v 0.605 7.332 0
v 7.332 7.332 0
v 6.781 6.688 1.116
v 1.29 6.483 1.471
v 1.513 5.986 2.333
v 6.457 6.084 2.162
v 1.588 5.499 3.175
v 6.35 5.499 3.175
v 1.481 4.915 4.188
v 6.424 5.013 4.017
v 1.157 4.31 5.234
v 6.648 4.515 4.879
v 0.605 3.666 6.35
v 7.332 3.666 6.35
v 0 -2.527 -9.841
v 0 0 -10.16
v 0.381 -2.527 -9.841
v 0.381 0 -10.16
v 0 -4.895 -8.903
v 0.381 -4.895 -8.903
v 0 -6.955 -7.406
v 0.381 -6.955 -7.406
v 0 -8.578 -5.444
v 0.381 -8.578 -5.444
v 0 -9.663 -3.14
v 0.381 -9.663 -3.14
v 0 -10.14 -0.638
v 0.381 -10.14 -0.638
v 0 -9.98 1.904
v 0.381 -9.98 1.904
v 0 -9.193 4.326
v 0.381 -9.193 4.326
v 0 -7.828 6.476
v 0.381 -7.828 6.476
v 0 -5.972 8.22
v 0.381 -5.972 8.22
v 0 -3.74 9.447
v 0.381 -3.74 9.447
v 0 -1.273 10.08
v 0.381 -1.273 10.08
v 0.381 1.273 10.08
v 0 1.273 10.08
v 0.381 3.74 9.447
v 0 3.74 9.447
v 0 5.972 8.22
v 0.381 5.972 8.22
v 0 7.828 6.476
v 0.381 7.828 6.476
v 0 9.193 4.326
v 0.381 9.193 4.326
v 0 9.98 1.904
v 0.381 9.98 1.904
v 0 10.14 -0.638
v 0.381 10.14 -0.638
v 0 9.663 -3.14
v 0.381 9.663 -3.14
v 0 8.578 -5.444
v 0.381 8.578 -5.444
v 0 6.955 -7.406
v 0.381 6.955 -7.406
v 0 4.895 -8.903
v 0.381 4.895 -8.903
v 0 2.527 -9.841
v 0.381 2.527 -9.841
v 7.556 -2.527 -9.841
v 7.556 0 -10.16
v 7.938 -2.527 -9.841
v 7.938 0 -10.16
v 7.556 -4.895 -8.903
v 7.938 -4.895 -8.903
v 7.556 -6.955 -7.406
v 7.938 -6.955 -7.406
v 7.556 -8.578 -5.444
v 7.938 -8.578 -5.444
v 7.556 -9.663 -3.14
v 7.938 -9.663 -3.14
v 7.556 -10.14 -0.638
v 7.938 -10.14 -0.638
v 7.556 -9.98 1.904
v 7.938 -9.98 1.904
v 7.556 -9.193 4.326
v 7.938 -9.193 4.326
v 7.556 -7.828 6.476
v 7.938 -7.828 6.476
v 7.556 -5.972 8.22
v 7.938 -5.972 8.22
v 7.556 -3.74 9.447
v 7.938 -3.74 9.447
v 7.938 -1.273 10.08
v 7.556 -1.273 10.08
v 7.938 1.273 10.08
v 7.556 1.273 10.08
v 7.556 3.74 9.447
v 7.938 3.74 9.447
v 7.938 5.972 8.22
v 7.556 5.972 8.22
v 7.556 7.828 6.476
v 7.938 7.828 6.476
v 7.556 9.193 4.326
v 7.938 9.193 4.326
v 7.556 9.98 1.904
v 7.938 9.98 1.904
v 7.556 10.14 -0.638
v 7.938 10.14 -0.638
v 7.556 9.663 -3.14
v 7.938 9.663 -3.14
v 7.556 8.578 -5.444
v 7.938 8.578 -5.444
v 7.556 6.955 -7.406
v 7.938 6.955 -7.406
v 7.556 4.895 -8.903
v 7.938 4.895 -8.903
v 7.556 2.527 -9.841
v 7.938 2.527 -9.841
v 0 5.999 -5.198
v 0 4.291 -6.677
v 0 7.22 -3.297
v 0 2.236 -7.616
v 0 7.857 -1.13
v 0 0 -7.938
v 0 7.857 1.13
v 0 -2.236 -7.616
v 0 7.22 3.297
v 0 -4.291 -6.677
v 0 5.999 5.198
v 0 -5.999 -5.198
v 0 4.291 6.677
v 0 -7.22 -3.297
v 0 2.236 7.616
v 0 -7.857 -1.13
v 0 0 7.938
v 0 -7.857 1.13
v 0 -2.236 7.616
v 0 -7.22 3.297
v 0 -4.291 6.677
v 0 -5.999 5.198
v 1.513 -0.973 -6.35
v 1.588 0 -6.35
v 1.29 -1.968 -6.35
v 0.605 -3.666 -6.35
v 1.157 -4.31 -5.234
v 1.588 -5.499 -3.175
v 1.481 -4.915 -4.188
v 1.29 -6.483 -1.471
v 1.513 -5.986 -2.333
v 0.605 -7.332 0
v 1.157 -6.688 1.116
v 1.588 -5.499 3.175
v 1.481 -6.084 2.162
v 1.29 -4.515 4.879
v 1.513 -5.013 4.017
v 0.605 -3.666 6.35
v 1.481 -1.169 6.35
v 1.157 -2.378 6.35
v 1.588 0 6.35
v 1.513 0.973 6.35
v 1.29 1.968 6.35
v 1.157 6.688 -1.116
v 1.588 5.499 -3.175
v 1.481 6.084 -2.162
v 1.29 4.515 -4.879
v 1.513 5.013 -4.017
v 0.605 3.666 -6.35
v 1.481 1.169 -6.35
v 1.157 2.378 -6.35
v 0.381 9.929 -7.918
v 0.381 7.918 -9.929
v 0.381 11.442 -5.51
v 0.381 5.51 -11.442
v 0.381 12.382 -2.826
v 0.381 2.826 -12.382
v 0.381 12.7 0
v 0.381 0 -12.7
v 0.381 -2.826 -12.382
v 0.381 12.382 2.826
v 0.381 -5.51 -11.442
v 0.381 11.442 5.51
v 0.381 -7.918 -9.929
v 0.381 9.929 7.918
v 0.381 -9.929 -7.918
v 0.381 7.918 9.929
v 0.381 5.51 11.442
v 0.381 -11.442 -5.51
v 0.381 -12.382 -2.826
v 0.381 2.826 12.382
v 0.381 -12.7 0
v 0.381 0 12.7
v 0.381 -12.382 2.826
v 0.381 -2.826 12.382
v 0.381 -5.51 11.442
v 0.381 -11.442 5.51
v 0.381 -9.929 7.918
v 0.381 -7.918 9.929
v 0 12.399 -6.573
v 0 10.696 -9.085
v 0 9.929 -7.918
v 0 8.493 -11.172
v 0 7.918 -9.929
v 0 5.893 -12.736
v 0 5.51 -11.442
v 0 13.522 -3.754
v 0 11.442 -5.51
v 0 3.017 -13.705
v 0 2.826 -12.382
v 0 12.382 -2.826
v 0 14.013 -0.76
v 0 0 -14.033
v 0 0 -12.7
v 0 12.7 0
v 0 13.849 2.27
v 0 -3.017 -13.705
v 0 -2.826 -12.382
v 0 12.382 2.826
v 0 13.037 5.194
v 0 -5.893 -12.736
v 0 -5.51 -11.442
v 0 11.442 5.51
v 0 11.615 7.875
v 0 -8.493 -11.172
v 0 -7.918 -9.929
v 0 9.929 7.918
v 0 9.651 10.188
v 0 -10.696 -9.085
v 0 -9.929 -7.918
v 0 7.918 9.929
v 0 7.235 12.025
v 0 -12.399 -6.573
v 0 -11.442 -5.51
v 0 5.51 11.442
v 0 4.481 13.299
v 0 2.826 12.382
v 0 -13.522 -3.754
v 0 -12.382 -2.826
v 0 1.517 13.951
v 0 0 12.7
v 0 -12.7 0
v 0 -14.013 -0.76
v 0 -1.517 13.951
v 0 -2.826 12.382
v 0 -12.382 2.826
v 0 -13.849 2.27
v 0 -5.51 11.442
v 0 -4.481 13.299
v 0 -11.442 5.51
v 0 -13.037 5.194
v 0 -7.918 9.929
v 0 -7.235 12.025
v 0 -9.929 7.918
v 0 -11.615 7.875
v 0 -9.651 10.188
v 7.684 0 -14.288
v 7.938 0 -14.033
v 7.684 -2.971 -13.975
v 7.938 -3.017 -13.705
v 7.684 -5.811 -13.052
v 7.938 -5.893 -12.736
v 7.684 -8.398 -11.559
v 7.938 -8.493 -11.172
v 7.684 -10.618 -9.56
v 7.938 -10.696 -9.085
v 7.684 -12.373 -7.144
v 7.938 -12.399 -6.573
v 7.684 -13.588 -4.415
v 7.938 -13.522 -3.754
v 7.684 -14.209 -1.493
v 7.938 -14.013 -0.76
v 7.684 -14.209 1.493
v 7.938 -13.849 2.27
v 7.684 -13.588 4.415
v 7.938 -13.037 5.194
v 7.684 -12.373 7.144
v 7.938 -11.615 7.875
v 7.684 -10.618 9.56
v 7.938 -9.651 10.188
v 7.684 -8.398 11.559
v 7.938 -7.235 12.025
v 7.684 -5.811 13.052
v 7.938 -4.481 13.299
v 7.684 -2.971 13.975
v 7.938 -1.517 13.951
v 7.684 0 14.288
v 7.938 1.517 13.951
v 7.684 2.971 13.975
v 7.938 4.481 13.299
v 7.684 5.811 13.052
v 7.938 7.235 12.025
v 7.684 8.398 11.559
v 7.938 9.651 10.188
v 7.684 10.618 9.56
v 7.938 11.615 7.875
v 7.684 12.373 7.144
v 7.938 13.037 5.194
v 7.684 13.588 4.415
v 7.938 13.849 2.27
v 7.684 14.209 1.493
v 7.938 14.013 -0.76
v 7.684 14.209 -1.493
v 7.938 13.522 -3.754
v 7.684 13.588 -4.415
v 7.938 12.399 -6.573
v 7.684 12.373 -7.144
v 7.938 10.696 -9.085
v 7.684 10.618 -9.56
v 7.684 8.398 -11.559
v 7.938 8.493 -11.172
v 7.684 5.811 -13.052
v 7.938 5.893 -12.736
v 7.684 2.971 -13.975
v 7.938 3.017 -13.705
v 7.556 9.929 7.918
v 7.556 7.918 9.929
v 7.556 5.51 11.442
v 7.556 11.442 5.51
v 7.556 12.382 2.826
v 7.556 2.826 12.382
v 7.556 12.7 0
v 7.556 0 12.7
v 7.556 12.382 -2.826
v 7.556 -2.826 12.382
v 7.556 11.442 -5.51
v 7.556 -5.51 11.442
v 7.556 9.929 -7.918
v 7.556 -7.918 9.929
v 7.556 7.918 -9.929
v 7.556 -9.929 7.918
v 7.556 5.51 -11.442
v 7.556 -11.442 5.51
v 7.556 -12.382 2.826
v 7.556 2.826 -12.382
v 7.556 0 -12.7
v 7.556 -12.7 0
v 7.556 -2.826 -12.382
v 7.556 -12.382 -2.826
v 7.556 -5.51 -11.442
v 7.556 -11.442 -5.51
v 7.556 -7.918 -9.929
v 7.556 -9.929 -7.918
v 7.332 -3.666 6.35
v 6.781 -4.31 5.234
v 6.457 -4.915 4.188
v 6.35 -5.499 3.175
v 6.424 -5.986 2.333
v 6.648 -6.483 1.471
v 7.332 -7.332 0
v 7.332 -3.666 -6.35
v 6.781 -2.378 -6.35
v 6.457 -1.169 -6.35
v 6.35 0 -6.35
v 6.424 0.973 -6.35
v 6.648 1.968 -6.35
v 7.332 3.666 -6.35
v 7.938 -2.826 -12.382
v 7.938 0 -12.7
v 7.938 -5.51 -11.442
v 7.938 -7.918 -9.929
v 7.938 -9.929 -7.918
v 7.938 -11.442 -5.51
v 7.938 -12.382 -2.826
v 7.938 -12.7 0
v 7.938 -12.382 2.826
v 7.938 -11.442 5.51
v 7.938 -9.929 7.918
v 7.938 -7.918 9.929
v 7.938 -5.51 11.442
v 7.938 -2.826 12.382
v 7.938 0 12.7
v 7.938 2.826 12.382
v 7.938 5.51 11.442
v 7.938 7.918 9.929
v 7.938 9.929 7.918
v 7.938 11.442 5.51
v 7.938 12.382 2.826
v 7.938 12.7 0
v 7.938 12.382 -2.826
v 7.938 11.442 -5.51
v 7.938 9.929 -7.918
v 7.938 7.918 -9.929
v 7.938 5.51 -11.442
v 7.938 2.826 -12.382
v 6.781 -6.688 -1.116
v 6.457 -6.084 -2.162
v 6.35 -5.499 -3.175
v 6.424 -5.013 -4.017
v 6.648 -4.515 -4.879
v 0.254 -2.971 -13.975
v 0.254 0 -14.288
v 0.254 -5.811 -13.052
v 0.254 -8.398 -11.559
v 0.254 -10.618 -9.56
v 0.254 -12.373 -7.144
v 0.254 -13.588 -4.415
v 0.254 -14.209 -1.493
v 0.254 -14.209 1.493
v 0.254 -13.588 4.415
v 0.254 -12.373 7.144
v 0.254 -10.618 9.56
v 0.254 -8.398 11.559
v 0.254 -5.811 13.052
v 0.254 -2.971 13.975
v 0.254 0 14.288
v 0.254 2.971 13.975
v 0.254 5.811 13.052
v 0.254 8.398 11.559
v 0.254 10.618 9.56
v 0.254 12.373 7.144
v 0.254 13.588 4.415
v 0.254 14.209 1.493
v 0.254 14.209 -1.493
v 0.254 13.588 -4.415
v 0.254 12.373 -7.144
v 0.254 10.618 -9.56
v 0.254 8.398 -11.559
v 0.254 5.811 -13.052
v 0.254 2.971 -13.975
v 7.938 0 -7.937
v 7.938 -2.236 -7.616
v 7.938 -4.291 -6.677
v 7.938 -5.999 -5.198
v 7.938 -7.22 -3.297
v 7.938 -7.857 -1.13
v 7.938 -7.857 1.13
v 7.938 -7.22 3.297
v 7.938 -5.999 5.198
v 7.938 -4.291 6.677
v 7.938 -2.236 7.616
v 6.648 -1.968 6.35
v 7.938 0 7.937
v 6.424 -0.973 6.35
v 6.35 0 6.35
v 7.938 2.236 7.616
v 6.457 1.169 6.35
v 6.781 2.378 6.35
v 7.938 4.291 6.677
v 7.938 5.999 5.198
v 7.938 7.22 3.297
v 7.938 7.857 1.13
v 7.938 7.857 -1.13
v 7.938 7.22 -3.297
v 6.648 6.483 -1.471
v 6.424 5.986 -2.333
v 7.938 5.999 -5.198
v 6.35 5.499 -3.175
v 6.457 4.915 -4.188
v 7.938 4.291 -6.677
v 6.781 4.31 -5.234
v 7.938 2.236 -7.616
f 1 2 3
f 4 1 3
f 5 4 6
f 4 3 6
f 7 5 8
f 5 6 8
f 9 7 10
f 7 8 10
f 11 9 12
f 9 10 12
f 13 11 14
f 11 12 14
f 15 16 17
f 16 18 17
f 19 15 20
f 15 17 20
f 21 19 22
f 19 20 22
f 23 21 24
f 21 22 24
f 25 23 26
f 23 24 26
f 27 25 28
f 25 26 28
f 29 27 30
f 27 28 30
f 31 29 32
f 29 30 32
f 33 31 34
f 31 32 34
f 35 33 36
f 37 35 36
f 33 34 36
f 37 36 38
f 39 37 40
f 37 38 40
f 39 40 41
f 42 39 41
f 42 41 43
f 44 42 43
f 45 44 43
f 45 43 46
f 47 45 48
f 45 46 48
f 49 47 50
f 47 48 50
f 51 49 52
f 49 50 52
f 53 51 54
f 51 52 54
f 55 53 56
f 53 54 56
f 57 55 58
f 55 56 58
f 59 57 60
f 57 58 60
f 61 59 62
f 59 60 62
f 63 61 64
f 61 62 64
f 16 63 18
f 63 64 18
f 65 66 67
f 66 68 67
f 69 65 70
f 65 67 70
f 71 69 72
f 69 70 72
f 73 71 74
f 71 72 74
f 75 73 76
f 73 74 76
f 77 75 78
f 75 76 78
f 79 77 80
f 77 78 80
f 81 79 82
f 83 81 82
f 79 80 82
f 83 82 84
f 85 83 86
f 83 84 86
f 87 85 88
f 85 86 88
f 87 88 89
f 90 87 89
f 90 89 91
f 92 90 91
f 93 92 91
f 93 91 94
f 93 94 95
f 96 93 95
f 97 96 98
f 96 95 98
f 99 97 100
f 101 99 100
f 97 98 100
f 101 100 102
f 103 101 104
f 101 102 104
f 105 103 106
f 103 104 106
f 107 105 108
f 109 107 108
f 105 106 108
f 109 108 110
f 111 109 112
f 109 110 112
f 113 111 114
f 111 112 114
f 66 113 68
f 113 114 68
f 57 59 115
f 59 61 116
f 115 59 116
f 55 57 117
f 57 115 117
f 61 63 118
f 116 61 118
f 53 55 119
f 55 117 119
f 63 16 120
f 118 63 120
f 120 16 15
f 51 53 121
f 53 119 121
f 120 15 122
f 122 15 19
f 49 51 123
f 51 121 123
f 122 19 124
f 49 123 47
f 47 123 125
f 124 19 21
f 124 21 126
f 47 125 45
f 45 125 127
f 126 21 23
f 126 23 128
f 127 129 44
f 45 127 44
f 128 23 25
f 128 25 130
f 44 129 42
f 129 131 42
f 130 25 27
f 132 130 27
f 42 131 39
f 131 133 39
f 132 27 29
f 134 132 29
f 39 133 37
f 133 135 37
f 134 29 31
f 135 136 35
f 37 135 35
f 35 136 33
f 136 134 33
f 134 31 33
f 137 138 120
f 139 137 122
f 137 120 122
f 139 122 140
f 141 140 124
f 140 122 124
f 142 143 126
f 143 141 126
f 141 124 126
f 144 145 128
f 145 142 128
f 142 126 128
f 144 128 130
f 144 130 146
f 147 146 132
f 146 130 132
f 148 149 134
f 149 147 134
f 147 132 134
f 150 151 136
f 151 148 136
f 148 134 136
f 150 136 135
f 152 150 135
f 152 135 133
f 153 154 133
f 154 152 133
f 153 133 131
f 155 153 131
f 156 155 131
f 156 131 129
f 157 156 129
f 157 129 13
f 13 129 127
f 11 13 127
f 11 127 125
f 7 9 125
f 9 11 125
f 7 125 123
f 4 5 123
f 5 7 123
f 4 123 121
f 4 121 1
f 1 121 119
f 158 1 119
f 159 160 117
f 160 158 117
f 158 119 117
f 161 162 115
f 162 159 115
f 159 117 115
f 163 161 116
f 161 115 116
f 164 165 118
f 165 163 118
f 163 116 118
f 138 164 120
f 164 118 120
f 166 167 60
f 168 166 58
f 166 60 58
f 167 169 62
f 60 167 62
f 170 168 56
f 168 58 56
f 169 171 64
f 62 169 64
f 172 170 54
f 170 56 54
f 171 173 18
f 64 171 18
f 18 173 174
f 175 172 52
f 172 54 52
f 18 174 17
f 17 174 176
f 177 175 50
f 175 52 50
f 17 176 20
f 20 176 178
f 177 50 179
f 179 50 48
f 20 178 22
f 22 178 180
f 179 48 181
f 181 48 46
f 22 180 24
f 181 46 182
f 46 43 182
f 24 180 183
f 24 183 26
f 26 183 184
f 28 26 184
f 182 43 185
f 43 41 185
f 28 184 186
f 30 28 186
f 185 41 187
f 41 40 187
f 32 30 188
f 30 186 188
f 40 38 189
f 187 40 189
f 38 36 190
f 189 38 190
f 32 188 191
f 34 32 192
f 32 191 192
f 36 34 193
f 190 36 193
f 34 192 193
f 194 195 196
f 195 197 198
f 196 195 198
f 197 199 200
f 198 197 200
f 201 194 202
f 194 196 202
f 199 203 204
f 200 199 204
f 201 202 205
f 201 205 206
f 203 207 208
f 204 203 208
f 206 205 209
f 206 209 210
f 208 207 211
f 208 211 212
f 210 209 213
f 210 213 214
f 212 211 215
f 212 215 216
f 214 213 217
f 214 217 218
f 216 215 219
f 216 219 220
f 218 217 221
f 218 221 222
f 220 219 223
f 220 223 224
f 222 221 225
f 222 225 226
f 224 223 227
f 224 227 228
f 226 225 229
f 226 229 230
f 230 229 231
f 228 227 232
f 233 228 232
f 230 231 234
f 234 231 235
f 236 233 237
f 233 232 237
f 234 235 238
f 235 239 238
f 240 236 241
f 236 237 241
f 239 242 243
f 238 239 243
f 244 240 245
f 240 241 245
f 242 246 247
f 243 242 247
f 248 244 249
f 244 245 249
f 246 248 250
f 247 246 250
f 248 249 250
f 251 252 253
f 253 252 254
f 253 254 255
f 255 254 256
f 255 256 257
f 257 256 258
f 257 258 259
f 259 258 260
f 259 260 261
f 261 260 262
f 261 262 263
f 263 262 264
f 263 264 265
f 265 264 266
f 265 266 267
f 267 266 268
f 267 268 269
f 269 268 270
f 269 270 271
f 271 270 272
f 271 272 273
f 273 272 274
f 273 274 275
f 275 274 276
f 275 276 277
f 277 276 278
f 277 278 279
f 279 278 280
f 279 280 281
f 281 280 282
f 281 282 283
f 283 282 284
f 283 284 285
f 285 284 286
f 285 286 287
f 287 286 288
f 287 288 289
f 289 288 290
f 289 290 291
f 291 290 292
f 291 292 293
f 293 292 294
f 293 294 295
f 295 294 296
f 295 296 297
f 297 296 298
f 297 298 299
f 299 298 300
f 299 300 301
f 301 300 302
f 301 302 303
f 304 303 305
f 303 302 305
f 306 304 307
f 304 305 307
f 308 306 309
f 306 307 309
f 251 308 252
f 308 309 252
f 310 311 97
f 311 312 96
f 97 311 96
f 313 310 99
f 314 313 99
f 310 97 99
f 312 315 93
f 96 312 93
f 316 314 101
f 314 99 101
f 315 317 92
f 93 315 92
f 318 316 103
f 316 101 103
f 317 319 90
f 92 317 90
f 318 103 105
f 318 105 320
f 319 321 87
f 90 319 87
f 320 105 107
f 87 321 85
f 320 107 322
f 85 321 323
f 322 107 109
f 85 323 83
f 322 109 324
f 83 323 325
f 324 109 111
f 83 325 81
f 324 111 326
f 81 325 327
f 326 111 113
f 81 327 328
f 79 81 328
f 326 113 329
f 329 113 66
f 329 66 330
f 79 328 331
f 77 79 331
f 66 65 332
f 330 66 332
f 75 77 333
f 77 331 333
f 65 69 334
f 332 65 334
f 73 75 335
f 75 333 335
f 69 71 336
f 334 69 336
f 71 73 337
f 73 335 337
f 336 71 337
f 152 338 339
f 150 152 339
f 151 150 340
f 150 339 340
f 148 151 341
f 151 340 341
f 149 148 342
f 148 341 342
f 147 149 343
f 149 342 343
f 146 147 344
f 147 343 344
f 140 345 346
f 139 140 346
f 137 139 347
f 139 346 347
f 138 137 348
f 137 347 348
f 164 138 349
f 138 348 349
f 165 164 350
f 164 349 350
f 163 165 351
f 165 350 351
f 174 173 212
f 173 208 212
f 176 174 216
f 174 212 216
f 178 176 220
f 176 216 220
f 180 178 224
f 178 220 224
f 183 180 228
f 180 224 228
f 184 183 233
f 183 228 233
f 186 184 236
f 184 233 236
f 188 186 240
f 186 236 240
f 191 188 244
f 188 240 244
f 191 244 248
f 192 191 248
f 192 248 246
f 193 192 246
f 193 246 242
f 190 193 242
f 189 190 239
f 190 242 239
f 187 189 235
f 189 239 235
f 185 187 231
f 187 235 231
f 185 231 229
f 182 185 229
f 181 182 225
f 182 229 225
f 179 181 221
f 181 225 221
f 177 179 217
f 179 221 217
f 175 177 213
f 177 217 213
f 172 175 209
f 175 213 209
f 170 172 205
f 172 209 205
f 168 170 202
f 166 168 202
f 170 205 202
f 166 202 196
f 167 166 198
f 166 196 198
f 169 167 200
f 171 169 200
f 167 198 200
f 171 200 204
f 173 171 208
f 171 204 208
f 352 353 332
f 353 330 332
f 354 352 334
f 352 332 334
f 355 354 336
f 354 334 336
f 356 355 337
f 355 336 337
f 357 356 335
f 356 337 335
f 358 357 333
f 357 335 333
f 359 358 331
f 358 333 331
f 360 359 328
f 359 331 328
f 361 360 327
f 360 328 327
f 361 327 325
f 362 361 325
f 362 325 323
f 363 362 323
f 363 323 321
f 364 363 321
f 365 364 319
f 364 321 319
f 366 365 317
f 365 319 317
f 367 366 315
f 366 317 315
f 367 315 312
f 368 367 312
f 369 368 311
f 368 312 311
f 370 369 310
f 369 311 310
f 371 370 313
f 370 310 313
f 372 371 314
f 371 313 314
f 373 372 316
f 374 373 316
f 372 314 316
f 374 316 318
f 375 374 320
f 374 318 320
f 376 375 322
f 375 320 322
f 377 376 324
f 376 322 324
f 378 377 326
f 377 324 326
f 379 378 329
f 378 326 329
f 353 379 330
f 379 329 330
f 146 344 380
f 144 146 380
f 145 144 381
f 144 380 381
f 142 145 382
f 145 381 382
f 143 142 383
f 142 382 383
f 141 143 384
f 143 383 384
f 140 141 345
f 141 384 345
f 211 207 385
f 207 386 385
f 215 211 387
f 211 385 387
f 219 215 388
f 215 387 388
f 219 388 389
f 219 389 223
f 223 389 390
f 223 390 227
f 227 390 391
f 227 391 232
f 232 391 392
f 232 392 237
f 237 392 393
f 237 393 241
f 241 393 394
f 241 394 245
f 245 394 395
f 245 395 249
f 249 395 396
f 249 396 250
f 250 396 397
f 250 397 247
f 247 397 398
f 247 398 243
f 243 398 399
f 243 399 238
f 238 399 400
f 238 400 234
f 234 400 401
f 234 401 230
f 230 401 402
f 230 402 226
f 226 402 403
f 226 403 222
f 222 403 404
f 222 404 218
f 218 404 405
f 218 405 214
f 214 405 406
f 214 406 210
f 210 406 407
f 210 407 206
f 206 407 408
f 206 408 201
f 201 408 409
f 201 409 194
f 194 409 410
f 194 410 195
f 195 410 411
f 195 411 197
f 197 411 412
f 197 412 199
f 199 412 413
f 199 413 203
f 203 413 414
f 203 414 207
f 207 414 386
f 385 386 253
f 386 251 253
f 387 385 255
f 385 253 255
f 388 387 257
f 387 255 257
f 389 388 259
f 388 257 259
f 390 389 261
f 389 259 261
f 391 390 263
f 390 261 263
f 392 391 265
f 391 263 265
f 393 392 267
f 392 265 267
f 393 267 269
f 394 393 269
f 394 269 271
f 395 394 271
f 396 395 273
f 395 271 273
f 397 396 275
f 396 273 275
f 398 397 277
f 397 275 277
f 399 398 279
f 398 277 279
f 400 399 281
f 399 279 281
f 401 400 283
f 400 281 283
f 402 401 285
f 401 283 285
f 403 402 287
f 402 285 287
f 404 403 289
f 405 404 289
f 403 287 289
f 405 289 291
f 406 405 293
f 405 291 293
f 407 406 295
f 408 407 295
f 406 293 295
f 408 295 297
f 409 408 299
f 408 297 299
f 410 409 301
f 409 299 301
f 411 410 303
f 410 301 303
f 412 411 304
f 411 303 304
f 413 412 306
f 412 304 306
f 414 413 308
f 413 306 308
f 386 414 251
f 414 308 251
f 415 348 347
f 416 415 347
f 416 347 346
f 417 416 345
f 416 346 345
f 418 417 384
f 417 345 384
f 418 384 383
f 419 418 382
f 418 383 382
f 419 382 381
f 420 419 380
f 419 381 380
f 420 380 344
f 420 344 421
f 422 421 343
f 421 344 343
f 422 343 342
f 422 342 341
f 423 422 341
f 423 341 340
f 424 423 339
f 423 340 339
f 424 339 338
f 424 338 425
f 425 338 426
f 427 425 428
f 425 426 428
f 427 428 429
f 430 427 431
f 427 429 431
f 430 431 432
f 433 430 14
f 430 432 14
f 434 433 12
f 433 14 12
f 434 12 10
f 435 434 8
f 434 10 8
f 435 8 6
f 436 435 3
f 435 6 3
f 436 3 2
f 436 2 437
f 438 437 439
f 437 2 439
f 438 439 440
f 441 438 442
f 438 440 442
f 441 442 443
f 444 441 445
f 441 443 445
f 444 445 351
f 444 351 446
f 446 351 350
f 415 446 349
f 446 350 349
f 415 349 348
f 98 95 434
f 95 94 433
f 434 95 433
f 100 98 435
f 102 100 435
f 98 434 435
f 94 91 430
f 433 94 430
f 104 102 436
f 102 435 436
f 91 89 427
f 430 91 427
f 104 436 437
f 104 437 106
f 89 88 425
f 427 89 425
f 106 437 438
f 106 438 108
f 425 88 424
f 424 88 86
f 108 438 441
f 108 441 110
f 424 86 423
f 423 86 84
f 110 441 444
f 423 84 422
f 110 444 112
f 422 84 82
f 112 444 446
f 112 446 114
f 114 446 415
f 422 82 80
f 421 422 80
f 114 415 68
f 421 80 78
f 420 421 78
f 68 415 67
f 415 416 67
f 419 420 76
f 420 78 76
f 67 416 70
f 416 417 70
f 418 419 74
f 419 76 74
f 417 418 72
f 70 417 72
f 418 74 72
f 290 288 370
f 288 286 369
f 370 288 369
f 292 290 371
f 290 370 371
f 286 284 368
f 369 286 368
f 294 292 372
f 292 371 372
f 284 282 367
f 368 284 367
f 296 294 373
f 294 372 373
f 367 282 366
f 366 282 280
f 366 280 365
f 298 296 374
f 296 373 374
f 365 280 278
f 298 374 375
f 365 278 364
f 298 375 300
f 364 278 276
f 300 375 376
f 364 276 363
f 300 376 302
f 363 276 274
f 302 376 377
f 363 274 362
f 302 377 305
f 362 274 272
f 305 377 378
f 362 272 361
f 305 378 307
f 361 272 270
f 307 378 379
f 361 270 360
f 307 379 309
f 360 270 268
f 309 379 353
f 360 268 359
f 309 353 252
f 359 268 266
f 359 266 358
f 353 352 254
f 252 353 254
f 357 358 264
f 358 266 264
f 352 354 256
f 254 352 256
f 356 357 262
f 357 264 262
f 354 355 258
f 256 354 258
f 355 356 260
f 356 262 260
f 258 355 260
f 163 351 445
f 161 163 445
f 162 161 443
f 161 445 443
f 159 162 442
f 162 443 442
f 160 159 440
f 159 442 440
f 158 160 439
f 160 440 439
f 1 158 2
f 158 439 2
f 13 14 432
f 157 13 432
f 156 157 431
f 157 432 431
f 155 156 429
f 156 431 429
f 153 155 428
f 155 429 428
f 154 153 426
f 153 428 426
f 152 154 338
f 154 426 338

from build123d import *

# Parameters (mm, degrees)
CUT_EXTRUDE1_DEPTH = 22.708736000744032


with BuildPart() as part:
    # Sketch1 → Revolve1 (revolve)
    with BuildSketch(Plane.XY, mode=Mode.PRIVATE) as revolve1_sk:
        Polygon((0.254, 14.2875), (7.6835, 14.2875), (7.9375, 14.033499999999998), (7.9375, 12.7), (7.556499999999999, 12.7), (7.5565, 10.16), (7.9375, 10.16), (7.9375, 7.9374999999999964), (6.349999999999997, 6.349999999999998), (1.587500000000001, 6.3500000000000005), (0, 7.9375), (0, 10.16), (0.381, 10.16), (0.381, 12.7), (0, 12.7), (0, 14.033499999999998), align=None)
    revolve(revolve1_sk.sketch.rotate(Axis((0, 0, 0), (-1, 0, 0)), 90), axis=Axis((0, 0, 0), (-1, 0, 0)))

    # Sketch2 → Cut-Extrude1 (cut, through all)
    with BuildSketch(Plane(origin=(7.9375, 0, 0), x_dir=(0, 0, -1), z_dir=(1, 0, 0))):
        Polygon((-8.7e-16, 7.332348418708245), (-6.349999999999997, 3.6661742093541227), (-6.349999999999996, -3.666174209354121), (5.15e-15, -7.332348418708244), (6.349999999999999, -3.6661742093541214), (6.349999999999997, 3.6661742093541236), align=None)
    extrude(amount=-CUT_EXTRUDE1_DEPTH, mode=Mode.SUBTRACT)


solid = part.part
